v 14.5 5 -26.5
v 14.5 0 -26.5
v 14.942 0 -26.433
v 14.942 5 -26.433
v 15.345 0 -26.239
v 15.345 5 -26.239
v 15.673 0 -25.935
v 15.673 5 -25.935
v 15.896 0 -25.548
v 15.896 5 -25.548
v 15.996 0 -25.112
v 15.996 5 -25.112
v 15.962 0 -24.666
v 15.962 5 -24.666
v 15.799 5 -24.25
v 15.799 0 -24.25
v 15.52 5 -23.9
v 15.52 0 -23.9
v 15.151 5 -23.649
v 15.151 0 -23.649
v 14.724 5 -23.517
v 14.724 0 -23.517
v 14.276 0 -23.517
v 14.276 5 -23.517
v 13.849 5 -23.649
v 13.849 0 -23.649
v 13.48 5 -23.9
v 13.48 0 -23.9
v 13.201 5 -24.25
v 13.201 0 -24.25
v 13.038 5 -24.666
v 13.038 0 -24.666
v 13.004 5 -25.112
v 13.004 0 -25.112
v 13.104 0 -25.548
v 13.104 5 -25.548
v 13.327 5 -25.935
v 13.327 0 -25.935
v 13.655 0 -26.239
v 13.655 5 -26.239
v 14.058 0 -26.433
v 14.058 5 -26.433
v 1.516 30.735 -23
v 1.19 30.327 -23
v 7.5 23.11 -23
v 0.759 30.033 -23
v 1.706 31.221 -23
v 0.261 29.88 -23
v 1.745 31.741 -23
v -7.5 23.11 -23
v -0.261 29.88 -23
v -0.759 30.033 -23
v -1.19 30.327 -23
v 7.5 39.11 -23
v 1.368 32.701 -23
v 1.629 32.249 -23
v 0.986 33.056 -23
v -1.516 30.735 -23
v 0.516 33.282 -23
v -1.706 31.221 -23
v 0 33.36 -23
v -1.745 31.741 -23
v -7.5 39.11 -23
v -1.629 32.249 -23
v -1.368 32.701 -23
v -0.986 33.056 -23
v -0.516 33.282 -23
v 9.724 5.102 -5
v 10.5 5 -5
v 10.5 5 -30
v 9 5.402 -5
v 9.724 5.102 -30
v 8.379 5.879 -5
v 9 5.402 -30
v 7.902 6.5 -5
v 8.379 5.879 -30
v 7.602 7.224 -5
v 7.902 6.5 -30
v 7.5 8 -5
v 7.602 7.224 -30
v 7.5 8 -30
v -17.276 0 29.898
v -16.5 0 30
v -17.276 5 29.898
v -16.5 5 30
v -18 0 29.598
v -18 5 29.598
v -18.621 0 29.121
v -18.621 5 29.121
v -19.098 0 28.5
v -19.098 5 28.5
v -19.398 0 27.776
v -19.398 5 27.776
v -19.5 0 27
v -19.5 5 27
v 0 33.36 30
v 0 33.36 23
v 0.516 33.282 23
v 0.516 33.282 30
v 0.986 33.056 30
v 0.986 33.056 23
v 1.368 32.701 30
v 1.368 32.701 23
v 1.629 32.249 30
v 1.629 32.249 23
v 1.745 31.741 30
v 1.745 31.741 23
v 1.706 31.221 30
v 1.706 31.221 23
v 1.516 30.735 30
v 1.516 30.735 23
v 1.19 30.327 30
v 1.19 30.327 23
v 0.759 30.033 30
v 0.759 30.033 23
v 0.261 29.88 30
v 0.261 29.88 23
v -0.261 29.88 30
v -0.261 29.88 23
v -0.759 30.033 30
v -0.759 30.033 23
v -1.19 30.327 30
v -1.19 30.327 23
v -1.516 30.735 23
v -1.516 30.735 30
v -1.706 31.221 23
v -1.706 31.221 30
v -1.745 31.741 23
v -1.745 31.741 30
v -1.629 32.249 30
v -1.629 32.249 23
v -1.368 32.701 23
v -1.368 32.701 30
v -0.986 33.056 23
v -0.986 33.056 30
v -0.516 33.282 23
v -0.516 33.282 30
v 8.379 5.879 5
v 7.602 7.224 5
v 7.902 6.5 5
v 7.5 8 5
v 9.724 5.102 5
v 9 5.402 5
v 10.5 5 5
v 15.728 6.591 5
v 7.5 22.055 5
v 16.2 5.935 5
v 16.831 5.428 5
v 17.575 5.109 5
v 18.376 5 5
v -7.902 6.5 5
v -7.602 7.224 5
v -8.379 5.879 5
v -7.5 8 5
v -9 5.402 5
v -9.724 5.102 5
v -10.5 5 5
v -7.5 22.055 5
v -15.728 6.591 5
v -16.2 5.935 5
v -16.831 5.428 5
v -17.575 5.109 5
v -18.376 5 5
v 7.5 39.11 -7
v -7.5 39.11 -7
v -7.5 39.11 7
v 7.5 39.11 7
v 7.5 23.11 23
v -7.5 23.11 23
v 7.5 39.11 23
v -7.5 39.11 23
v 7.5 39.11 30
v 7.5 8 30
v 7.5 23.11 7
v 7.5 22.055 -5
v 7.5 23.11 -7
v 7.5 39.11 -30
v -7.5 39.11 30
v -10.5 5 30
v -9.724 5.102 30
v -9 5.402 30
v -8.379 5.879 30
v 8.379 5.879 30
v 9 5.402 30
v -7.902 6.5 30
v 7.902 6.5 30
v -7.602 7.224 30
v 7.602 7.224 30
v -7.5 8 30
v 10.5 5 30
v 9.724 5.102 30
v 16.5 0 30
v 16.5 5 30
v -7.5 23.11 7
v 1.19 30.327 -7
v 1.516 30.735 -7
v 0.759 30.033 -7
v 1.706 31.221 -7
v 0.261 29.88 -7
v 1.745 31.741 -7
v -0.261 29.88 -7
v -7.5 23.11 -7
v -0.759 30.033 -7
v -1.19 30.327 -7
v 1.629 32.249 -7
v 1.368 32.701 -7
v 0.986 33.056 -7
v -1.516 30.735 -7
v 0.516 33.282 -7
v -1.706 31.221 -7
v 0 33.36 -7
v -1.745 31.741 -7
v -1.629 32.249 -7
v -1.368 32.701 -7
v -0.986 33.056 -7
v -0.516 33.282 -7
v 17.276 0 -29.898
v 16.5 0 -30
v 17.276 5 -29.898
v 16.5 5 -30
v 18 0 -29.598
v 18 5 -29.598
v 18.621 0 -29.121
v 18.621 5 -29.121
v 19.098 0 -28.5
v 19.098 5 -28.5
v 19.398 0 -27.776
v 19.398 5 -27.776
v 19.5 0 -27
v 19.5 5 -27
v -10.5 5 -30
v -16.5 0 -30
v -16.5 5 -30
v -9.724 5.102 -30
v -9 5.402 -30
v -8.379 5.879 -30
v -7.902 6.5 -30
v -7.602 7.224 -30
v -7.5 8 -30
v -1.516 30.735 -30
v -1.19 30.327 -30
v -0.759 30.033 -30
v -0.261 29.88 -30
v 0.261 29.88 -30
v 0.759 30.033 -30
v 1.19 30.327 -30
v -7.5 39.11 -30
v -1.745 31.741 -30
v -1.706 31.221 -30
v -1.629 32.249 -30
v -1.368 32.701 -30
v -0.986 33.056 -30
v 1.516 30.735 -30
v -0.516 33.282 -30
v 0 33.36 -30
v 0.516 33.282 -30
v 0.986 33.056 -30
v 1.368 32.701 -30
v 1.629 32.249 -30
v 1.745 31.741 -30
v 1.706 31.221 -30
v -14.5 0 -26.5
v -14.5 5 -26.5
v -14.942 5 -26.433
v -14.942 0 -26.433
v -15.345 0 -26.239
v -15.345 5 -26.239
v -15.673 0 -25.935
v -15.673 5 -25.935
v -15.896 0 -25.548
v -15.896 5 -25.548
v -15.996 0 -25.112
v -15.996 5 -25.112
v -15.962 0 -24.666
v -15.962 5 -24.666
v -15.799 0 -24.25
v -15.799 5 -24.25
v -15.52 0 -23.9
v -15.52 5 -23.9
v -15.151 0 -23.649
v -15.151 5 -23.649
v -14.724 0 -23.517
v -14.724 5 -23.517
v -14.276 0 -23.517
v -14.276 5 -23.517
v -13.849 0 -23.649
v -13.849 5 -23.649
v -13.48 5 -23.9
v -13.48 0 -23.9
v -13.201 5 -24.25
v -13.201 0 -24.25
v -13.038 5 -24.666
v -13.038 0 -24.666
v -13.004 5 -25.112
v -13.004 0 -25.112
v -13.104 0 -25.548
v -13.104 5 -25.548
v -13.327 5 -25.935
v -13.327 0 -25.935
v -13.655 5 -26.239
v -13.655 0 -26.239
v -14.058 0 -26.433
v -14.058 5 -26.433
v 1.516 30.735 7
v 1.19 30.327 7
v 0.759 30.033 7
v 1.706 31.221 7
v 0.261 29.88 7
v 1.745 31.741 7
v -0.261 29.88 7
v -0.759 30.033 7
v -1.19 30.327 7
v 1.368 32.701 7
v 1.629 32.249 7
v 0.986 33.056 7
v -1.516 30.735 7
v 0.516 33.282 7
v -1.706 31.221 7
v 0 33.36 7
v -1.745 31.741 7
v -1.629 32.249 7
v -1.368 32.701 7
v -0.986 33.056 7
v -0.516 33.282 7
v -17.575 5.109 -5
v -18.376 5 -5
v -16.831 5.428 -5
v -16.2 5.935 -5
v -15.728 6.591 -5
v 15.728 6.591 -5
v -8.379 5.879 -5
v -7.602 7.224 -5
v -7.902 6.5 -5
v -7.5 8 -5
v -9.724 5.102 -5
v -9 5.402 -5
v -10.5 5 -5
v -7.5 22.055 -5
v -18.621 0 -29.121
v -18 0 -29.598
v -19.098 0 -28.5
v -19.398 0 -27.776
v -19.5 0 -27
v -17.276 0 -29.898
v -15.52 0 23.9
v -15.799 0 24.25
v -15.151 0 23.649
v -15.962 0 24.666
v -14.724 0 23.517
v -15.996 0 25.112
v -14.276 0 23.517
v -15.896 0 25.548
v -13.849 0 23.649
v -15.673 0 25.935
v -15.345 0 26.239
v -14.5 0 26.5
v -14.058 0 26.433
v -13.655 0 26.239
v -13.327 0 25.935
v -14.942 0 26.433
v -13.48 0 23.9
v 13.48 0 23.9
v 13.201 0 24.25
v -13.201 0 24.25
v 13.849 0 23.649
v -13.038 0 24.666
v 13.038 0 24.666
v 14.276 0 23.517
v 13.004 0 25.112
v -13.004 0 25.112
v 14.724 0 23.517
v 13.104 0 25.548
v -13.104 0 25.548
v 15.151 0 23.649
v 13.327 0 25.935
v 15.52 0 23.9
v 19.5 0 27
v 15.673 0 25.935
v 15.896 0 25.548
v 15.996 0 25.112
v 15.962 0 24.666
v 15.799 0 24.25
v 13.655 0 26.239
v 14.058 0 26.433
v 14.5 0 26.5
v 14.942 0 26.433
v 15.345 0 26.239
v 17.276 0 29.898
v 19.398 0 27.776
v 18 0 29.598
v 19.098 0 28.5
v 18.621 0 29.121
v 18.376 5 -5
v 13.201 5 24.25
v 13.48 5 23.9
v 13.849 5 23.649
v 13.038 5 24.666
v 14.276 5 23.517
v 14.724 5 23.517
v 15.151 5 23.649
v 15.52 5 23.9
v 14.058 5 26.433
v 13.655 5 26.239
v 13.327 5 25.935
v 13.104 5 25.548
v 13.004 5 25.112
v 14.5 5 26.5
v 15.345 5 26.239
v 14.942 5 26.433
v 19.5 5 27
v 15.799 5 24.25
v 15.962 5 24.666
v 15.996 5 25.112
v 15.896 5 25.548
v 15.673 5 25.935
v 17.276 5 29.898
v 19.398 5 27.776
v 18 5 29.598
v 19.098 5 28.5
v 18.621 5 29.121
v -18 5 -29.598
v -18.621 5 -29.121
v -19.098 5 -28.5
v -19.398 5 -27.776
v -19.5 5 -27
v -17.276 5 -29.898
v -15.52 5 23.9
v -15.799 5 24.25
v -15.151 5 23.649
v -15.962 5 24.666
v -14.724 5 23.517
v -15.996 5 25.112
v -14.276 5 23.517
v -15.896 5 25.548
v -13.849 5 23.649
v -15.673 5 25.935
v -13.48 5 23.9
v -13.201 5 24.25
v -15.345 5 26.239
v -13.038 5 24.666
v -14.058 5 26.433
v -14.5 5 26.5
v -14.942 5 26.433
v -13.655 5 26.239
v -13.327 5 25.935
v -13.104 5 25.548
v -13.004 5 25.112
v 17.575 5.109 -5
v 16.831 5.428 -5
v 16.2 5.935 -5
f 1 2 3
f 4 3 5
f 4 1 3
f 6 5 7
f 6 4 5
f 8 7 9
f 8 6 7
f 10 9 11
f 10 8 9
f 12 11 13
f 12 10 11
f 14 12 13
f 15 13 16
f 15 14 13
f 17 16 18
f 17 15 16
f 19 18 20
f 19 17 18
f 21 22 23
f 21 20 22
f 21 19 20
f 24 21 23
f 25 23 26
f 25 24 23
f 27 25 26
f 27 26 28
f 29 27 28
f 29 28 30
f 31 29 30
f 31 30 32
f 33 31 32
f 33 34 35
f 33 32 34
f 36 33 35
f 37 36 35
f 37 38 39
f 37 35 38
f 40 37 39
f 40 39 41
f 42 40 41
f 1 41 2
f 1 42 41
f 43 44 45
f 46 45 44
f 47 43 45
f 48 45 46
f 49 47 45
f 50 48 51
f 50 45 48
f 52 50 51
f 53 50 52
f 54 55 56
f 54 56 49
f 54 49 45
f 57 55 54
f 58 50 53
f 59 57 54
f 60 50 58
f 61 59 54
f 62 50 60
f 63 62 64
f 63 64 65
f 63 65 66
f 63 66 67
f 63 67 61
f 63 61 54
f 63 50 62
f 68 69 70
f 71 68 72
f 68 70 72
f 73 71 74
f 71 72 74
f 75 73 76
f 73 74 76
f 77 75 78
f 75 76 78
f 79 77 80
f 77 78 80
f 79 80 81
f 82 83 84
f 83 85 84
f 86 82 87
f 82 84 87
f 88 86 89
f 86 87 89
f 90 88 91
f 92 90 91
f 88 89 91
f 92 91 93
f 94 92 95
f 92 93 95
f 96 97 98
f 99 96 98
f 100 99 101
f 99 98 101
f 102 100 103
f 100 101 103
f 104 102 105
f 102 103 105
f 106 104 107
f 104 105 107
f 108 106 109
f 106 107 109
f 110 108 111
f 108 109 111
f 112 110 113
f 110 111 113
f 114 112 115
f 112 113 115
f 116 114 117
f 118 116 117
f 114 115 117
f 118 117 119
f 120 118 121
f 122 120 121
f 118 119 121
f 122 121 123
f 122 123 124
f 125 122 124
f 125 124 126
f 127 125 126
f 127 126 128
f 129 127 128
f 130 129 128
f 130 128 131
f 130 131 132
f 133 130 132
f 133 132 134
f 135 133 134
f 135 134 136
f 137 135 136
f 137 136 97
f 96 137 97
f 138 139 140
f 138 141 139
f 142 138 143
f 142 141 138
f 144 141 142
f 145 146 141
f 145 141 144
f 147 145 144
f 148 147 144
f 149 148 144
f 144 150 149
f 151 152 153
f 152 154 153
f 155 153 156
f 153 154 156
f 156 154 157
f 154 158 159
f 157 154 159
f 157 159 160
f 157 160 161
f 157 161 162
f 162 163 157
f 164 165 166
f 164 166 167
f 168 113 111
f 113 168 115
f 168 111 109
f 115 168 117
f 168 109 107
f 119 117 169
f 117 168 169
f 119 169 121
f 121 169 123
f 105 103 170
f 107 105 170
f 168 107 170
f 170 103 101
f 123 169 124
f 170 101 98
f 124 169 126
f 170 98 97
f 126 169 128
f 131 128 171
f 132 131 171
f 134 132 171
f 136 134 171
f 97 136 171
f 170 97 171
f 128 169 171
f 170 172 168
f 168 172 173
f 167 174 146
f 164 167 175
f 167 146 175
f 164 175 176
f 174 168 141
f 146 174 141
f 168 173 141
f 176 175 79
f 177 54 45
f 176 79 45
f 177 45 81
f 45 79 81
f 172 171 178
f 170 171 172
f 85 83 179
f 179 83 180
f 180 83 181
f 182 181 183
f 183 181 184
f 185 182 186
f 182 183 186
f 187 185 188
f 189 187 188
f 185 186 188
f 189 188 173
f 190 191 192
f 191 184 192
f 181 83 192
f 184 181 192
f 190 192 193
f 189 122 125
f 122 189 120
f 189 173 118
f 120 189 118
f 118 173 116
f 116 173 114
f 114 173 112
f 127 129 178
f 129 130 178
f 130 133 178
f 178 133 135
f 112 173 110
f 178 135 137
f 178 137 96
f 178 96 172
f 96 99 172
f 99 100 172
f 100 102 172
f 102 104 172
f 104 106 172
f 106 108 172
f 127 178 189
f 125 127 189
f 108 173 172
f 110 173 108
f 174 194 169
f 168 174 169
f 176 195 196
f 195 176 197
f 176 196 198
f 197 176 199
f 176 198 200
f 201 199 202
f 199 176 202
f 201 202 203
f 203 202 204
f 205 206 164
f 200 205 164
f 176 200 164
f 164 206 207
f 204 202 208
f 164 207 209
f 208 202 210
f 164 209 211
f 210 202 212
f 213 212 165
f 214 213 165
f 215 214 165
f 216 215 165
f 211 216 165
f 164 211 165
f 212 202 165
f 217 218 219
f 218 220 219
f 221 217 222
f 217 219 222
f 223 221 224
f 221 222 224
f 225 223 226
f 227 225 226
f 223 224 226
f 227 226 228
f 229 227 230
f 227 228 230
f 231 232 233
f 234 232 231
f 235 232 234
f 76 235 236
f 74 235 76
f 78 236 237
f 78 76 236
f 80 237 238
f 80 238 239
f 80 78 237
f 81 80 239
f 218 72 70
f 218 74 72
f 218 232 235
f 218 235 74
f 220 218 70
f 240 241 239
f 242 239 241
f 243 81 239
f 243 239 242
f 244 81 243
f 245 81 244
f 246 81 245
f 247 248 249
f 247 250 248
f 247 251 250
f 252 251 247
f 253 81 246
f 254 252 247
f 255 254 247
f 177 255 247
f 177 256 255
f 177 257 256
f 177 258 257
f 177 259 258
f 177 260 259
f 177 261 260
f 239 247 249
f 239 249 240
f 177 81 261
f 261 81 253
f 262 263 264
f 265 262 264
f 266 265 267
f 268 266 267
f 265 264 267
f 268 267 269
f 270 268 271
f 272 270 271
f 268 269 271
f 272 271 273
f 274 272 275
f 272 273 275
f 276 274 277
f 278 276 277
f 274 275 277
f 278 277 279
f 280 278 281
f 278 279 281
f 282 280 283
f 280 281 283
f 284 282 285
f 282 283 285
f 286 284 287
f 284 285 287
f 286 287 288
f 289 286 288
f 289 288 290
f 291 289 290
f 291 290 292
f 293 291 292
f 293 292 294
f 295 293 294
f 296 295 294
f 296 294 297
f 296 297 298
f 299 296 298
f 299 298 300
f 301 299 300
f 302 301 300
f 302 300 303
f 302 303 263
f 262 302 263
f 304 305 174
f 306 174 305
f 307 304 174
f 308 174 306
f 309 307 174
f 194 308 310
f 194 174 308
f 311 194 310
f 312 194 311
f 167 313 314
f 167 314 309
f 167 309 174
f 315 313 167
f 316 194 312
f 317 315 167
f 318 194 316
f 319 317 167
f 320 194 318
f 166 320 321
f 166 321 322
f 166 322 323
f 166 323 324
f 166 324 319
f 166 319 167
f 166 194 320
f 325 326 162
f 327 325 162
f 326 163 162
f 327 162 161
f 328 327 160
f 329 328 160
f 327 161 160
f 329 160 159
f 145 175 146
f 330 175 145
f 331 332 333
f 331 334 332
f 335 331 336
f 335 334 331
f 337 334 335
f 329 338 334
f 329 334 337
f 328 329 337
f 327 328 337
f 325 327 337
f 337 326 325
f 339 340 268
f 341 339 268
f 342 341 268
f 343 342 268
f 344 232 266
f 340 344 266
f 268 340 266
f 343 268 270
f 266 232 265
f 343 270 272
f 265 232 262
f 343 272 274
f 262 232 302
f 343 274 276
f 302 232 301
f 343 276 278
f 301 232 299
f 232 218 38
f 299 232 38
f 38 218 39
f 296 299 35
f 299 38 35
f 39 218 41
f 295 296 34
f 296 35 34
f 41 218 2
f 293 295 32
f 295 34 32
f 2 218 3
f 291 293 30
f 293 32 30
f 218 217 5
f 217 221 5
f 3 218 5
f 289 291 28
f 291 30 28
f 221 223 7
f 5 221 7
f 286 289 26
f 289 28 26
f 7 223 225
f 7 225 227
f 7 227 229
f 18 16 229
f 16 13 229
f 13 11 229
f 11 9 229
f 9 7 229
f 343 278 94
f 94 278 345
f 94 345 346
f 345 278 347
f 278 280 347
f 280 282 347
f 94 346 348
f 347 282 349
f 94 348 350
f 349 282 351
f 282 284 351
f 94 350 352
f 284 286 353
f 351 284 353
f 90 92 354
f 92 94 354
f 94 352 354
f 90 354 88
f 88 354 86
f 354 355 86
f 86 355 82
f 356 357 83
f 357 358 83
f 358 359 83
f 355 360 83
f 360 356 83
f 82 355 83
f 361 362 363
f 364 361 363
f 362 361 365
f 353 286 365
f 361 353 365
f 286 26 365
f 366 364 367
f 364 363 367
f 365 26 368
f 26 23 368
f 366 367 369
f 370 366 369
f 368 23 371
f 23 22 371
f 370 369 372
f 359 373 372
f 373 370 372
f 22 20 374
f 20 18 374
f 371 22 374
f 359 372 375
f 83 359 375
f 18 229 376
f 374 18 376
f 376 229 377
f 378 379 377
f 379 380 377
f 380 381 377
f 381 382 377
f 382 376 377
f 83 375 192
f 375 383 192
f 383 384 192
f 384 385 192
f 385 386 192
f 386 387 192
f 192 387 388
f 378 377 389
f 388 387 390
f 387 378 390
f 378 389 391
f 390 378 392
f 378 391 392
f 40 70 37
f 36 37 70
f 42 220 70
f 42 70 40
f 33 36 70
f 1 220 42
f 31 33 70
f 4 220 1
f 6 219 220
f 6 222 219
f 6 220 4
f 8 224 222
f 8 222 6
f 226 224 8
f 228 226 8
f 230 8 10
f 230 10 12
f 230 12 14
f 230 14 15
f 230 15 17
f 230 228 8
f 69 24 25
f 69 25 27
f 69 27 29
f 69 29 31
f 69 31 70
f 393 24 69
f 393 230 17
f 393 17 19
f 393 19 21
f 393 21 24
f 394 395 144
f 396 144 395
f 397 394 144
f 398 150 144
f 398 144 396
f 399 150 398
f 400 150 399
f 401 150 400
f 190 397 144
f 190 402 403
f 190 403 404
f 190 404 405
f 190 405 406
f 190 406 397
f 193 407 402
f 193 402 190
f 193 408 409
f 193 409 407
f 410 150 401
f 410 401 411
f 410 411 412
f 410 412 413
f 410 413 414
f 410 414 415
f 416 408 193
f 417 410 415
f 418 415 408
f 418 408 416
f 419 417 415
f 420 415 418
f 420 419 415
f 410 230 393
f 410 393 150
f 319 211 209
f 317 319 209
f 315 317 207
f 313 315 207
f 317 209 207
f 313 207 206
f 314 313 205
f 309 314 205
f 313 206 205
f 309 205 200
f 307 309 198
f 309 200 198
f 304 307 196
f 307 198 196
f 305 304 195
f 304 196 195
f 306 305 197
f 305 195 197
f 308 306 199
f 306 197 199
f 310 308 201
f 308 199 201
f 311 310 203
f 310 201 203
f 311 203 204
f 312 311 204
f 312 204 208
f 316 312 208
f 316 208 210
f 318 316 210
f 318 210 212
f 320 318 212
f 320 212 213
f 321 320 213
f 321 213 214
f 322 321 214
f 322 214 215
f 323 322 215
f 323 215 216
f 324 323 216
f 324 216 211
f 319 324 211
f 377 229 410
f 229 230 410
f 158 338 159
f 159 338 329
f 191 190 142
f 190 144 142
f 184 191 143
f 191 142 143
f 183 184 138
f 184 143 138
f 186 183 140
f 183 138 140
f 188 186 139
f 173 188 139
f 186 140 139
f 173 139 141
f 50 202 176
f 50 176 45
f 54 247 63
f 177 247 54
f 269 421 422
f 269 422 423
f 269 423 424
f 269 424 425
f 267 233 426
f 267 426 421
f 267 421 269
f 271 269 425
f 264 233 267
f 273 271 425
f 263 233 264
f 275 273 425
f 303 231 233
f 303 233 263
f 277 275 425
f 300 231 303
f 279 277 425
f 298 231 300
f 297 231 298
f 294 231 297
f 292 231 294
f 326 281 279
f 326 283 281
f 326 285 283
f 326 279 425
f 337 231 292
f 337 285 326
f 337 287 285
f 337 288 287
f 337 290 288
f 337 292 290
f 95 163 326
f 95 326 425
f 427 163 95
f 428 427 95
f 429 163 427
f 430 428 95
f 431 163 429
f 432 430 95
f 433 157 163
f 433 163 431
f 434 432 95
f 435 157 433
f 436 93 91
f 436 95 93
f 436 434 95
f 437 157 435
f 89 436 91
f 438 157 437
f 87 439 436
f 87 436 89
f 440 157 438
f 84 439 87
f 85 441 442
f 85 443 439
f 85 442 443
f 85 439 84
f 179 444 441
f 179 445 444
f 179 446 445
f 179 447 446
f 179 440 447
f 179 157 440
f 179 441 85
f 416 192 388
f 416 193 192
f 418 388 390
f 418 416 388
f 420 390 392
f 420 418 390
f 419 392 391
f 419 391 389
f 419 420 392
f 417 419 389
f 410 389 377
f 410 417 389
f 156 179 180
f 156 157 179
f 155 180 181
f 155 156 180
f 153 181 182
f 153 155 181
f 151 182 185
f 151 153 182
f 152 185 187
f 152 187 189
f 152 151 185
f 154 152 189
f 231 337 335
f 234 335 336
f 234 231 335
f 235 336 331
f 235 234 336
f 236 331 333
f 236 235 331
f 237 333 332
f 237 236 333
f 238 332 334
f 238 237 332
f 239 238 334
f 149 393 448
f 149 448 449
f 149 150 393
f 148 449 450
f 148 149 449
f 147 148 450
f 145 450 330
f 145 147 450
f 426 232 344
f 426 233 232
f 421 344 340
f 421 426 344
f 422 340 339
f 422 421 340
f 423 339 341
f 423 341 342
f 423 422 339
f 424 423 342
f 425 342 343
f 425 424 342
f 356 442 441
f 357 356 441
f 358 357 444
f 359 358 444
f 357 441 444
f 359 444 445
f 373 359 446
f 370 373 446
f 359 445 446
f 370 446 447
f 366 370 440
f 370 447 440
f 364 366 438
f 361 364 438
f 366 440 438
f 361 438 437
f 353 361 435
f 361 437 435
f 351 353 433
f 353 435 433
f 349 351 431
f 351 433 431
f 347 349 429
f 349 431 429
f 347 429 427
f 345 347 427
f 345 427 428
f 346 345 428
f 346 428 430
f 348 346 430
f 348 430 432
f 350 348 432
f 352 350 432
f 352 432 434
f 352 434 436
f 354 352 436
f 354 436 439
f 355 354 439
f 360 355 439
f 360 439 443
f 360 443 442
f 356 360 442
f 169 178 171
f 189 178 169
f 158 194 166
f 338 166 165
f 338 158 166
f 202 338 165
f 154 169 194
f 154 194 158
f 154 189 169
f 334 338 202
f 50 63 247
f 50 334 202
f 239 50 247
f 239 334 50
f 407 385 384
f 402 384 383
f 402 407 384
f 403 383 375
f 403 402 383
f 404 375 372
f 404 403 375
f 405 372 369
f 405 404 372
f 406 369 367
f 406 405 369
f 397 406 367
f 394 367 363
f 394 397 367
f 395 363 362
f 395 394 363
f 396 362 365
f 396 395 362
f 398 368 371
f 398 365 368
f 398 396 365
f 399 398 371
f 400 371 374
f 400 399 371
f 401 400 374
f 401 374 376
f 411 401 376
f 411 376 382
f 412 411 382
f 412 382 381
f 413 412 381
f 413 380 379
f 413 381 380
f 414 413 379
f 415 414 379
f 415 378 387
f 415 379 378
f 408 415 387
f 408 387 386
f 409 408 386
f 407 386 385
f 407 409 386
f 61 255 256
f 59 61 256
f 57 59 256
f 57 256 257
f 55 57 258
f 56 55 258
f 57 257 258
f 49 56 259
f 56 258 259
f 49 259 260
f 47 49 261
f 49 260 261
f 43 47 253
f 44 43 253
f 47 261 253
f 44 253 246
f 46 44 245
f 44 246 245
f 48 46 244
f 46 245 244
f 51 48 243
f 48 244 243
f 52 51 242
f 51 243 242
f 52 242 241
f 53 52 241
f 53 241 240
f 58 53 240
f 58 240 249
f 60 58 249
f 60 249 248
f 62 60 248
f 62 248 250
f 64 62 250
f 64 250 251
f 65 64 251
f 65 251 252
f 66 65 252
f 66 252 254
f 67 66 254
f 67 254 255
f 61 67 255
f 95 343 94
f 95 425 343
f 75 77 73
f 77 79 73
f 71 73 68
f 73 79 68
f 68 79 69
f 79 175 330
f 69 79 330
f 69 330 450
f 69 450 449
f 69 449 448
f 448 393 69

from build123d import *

# Parameters (mm, degrees)
SKETCH1_W                = 15
SKETCH1_H                = 60
BOSS_EXTRUDE2_DEPTH      = 39.11
BOSS_EXTRUDE3_DEPTH      = 12
BOSS_EXTRUDE3_DEPTH_BACK = 27
SKETCH3_W                = 60
SKETCH3_H                = 5
RIB1_REACH               = 55.008
SKETCH5_WALL_W           = 127.334599132
SKETCH5_WALL_H           = 10
SKETCH6_R                = 1.5
CUT_EXTRUDE2_DEPTH       = 50.434219929
SKETCH7_W                = 16
SKETCH7_H                = 16
CUT_EXTRUDE3_DEPTH       = 57.201353187
SKETCH8_R                = 1.75
CUT_EXTRUDE4_DEPTH       = 75.228310637
FILLET1_R                = 3


with BuildPart() as part:
    # Sketch1 → Boss-Extrude2 (new body)
    with BuildSketch(Plane(origin=(0, 0, 0), x_dir=(1, 0, 0), z_dir=(0, 1, 0))):
        Rectangle(SKETCH1_W, SKETCH1_H)
    extrude(amount=BOSS_EXTRUDE2_DEPTH)

    # Sketch3 → Boss-Extrude3 (add, two sides: drawn at the far end of the back side and taken through both)
    with BuildSketch(Plane.ZY.offset(7.5).offset(-BOSS_EXTRUDE3_DEPTH_BACK)):
        with Locations((0, 2.5)):
            Rectangle(SKETCH3_W, SKETCH3_H)
    extrude(amount=BOSS_EXTRUDE3_DEPTH + BOSS_EXTRUDE3_DEPTH_BACK)

    # Sketch5 wall → Rib1 (add, up to next)
    with BuildSketch(Plane(origin=(-12.037058369, 13.5275, 0), x_dir=(-0.46970610176, -0.882822846311, 0), z_dir=(0.882822846311, -0.46970610176, 0)), mode=Mode.PRIVATE) as rib1_sk1:
        Rectangle(SKETCH5_WALL_W, SKETCH5_WALL_H)
    rib1_tool1 = extrude(rib1_sk1.sketch, amount=RIB1_REACH, mode=Mode.PRIVATE) - part.part
    rib1 = rib1_tool1.solids().sort_by_distance((-12.037058369, 13.5275, 0))[0]
    add(rib1)

    # Sketch6 → Cut-Extrude2 (cut, through all)
    with BuildSketch(Plane(origin=(0, 5, 0), x_dir=(1, 0, 0), z_dir=(0, 1, 0))):
        with Locations((-14.5, -25)):
            Circle(SKETCH6_R)
        with Locations((-14.5, 25)):
            Circle(SKETCH6_R)
    cut_extrude2 = extrude(amount=-CUT_EXTRUDE2_DEPTH, mode=Mode.SUBTRACT)

    # Mirror1: Rib1, Cut-Extrude2 across plane
    add(rib1.mirror(Plane(origin=(0, 0, 0), x_dir=(0, 0, 1), z_dir=(1, 0, 0))))
    add(cut_extrude2.mirror(Plane(origin=(0, 0, 0), x_dir=(0, 0, 1), z_dir=(1, 0, 0))), mode=Mode.SUBTRACT)

    # Sketch7 → Cut-Extrude3 (cut, through all)
    with BuildSketch(Plane.ZY.offset(7.5)):
        with Locations((15, 31.11)):
            Rectangle(SKETCH7_W, SKETCH7_H)
    cut_extrude3 = extrude(amount=-CUT_EXTRUDE3_DEPTH, mode=Mode.SUBTRACT)

    # Mirror2: Cut-Extrude3 across plane
    add(cut_extrude3.mirror(Plane.XY), mode=Mode.SUBTRACT)

    # Sketch8 → Cut-Extrude4 (cut, through all)
    with BuildSketch(Plane(origin=(0, 0, -30), x_dir=(-1, 0, 0), z_dir=(0, 0, -1))):
        with Locations((0, 31.61)):
            Circle(SKETCH8_R)
    extrude(amount=-CUT_EXTRUDE4_DEPTH, mode=Mode.SUBTRACT)

    # Fillet1
    fillet1_edges = [part.edges().sort_by_distance(p)[0] for p in [
        (-16.574116738, 5, 0),
        (-7.5, 5, -17.5),
        (-7.5, 5, 17.5),
        (16.574116738, 5, 0),
        (7.5, 5, 17.5),
        (7.5, 5, -17.5),
    ]]
    fillet(fillet1_edges, radius=FILLET1_R)
    fillet1_2_edges = [part.edges().sort_by_distance(p)[0] for p in [
        (19.5, 2.5, -30),
        (19.5, 2.5, 30),
        (-19.5, 2.5, 30),
        (-19.5, 2.5, -30),
    ]]
    fillet(fillet1_2_edges, radius=FILLET1_R)


solid = part.part
